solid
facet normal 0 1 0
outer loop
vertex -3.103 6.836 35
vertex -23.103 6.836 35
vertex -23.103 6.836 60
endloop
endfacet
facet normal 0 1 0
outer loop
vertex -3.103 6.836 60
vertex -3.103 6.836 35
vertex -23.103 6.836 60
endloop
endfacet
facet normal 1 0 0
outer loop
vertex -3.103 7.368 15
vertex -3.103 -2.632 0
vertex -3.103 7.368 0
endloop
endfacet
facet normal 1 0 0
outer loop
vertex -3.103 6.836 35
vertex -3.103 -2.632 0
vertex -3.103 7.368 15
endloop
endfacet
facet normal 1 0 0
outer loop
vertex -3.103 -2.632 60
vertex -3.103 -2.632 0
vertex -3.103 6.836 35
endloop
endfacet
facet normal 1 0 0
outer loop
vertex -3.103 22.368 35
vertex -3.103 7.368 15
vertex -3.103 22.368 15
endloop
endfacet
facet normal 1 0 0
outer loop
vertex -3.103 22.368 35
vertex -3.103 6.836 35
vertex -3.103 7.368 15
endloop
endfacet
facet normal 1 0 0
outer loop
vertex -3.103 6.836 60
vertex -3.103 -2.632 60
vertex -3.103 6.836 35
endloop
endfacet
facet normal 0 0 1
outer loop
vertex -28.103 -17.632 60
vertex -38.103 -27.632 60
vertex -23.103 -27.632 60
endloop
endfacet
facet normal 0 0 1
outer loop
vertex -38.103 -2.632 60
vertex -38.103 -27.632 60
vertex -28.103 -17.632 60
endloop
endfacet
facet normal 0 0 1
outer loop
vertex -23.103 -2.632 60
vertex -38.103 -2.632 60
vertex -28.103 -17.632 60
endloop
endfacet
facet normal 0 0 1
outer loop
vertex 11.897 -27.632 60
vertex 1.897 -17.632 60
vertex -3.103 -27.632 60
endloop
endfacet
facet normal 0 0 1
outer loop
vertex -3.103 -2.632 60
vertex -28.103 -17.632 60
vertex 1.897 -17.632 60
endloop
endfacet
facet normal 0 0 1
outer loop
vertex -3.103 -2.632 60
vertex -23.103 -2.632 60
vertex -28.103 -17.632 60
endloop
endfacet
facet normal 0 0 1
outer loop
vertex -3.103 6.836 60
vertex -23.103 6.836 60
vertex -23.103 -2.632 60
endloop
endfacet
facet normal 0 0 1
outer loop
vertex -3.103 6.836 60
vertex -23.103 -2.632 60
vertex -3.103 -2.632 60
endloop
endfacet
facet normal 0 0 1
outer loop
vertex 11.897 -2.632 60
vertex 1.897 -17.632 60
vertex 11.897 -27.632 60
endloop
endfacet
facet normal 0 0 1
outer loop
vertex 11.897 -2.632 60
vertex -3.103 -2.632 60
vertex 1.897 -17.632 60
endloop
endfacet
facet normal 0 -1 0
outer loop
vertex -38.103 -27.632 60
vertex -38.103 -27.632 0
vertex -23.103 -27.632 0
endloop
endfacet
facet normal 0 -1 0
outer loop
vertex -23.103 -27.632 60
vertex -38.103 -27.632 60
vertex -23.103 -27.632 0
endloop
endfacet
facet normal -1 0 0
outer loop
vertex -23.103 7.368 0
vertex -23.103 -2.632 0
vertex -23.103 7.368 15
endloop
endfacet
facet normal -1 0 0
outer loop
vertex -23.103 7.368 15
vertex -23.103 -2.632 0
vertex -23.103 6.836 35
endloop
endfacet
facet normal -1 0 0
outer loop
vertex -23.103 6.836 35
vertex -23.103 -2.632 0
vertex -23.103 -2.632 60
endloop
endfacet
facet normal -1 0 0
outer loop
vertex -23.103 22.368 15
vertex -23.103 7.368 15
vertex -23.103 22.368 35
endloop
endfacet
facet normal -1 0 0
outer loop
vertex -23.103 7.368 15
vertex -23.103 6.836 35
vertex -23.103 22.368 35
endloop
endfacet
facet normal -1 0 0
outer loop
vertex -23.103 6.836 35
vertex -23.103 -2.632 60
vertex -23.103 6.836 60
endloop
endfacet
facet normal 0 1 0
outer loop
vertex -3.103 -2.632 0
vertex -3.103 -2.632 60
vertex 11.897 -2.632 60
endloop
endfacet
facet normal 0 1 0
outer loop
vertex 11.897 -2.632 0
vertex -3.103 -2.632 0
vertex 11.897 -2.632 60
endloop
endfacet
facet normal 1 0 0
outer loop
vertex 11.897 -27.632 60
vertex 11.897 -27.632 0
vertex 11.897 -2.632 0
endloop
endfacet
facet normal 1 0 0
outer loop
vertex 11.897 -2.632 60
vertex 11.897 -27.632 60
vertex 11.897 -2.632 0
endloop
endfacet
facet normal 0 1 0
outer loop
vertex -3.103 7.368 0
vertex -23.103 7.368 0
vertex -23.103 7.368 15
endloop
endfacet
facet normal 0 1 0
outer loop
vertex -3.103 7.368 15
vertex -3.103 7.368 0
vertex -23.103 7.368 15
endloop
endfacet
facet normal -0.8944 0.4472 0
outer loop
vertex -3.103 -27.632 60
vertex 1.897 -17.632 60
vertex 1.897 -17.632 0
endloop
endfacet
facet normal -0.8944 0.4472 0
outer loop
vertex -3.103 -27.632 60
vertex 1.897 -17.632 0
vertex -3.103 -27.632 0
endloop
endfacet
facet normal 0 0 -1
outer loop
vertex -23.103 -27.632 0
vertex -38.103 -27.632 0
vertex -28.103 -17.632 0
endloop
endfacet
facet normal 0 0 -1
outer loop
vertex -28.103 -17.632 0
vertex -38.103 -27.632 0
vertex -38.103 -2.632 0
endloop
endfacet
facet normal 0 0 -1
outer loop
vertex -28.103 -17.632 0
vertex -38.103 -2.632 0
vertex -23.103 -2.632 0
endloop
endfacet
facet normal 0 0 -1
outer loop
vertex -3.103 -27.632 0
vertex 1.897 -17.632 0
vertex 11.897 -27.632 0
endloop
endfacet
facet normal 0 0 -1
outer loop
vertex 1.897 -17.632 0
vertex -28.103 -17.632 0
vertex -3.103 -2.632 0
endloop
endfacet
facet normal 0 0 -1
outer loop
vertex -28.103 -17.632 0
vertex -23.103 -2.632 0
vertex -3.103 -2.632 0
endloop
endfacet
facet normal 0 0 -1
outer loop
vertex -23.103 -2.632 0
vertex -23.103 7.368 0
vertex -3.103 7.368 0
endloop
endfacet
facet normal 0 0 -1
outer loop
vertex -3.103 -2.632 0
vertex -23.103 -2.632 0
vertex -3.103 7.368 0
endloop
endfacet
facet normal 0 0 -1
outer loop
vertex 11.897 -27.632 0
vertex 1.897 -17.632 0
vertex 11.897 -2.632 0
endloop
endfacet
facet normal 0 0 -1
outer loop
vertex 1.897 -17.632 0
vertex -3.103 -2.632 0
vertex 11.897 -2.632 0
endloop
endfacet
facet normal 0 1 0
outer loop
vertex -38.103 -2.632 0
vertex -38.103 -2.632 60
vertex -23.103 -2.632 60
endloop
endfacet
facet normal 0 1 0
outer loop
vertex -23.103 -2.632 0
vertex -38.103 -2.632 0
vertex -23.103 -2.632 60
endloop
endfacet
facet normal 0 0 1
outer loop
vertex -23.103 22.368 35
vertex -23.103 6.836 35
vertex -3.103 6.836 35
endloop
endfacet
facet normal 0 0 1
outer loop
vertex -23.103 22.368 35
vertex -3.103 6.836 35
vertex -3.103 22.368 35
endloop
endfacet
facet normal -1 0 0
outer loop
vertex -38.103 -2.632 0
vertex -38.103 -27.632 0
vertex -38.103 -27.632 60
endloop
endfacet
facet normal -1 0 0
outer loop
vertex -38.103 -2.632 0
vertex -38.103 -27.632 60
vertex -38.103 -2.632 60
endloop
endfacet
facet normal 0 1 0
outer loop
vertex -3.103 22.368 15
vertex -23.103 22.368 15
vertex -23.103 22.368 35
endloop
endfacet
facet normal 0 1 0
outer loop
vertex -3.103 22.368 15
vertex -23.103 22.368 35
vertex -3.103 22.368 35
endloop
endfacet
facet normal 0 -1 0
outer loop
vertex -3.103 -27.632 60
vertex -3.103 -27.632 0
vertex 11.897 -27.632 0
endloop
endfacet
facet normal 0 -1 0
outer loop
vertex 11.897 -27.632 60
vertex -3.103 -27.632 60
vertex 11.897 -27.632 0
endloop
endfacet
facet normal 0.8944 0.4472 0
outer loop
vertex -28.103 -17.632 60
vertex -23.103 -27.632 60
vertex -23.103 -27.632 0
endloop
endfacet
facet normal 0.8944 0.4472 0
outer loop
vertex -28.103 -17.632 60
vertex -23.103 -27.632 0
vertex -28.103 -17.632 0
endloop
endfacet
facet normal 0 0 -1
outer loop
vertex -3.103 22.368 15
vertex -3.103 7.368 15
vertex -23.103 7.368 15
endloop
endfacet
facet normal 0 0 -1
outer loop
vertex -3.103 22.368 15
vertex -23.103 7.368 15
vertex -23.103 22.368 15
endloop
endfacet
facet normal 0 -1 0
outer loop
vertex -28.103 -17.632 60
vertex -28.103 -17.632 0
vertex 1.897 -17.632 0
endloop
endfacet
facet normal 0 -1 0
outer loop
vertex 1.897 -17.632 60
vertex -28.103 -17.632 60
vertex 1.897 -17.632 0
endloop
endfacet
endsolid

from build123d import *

# Parameters (mm, degrees)
IZIM1_W                     = 50
IZIM1_H                     = 50
Y_KSEKLIK_EKSTR_ZYON1_DEPTH = 60
KES_EKSTR_ZYON1_DEPTH       = 60
IZIM3_W                     = 15
IZIM3_H                     = 25
KES_EKSTR_ZYON2_DEPTH       = 60
IZIM4_W                     = 15
IZIM4_H                     = 15
IZIM4_W_2                   = 25
IZIM4_H_2                   = 15.532057861
KES_EKSTR_ZYON3_DEPTH       = 20


with BuildPart() as part:
    # Çizim1 → Yükseklik-Ekstrüzyon1 (new body)
    with BuildSketch(Plane.XY):
        with Locations((-13.102970675, -2.631578947)):
            Rectangle(IZIM1_W, IZIM1_H)
    extrude(amount=Y_KSEKLIK_EKSTR_ZYON1_DEPTH)

    # Çizim2 → Kes-Ekstrüzyon1 (cut)
    with BuildSketch(Plane.XY.offset(60)):
        Polygon((-28.102970675, -17.631578947), (1.897029325, -17.631578947), (-3.102970675, -27.631578947), (-23.102970675, -27.631578947), align=None)
    extrude(amount=-KES_EKSTR_ZYON1_DEPTH, mode=Mode.SUBTRACT)

    # Çizim3 → Kes-Ekstrüzyon2 (cut)
    with BuildSketch(Plane.XY.offset(60)):
        with Locations((4.397029325, 9.868421053)):
            Rectangle(IZIM3_W, IZIM3_H)
        with Locations((-30.602970675, 9.868421053)):
            Rectangle(IZIM3_W, IZIM3_H)
    extrude(amount=-KES_EKSTR_ZYON2_DEPTH, mode=Mode.SUBTRACT)

    # Çizim4 → Kes-Ekstrüzyon3 (cut)
    with BuildSketch(Plane.ZY.offset(23.102970675)):
        with Locations((7.5, 14.868421053)):
            Rectangle(IZIM4_W, IZIM4_H)
        with Locations((47.5, 14.602392123)):
            Rectangle(IZIM4_W_2, IZIM4_H_2)
    extrude(amount=-KES_EKSTR_ZYON3_DEPTH, mode=Mode.SUBTRACT)


solid = part.part
